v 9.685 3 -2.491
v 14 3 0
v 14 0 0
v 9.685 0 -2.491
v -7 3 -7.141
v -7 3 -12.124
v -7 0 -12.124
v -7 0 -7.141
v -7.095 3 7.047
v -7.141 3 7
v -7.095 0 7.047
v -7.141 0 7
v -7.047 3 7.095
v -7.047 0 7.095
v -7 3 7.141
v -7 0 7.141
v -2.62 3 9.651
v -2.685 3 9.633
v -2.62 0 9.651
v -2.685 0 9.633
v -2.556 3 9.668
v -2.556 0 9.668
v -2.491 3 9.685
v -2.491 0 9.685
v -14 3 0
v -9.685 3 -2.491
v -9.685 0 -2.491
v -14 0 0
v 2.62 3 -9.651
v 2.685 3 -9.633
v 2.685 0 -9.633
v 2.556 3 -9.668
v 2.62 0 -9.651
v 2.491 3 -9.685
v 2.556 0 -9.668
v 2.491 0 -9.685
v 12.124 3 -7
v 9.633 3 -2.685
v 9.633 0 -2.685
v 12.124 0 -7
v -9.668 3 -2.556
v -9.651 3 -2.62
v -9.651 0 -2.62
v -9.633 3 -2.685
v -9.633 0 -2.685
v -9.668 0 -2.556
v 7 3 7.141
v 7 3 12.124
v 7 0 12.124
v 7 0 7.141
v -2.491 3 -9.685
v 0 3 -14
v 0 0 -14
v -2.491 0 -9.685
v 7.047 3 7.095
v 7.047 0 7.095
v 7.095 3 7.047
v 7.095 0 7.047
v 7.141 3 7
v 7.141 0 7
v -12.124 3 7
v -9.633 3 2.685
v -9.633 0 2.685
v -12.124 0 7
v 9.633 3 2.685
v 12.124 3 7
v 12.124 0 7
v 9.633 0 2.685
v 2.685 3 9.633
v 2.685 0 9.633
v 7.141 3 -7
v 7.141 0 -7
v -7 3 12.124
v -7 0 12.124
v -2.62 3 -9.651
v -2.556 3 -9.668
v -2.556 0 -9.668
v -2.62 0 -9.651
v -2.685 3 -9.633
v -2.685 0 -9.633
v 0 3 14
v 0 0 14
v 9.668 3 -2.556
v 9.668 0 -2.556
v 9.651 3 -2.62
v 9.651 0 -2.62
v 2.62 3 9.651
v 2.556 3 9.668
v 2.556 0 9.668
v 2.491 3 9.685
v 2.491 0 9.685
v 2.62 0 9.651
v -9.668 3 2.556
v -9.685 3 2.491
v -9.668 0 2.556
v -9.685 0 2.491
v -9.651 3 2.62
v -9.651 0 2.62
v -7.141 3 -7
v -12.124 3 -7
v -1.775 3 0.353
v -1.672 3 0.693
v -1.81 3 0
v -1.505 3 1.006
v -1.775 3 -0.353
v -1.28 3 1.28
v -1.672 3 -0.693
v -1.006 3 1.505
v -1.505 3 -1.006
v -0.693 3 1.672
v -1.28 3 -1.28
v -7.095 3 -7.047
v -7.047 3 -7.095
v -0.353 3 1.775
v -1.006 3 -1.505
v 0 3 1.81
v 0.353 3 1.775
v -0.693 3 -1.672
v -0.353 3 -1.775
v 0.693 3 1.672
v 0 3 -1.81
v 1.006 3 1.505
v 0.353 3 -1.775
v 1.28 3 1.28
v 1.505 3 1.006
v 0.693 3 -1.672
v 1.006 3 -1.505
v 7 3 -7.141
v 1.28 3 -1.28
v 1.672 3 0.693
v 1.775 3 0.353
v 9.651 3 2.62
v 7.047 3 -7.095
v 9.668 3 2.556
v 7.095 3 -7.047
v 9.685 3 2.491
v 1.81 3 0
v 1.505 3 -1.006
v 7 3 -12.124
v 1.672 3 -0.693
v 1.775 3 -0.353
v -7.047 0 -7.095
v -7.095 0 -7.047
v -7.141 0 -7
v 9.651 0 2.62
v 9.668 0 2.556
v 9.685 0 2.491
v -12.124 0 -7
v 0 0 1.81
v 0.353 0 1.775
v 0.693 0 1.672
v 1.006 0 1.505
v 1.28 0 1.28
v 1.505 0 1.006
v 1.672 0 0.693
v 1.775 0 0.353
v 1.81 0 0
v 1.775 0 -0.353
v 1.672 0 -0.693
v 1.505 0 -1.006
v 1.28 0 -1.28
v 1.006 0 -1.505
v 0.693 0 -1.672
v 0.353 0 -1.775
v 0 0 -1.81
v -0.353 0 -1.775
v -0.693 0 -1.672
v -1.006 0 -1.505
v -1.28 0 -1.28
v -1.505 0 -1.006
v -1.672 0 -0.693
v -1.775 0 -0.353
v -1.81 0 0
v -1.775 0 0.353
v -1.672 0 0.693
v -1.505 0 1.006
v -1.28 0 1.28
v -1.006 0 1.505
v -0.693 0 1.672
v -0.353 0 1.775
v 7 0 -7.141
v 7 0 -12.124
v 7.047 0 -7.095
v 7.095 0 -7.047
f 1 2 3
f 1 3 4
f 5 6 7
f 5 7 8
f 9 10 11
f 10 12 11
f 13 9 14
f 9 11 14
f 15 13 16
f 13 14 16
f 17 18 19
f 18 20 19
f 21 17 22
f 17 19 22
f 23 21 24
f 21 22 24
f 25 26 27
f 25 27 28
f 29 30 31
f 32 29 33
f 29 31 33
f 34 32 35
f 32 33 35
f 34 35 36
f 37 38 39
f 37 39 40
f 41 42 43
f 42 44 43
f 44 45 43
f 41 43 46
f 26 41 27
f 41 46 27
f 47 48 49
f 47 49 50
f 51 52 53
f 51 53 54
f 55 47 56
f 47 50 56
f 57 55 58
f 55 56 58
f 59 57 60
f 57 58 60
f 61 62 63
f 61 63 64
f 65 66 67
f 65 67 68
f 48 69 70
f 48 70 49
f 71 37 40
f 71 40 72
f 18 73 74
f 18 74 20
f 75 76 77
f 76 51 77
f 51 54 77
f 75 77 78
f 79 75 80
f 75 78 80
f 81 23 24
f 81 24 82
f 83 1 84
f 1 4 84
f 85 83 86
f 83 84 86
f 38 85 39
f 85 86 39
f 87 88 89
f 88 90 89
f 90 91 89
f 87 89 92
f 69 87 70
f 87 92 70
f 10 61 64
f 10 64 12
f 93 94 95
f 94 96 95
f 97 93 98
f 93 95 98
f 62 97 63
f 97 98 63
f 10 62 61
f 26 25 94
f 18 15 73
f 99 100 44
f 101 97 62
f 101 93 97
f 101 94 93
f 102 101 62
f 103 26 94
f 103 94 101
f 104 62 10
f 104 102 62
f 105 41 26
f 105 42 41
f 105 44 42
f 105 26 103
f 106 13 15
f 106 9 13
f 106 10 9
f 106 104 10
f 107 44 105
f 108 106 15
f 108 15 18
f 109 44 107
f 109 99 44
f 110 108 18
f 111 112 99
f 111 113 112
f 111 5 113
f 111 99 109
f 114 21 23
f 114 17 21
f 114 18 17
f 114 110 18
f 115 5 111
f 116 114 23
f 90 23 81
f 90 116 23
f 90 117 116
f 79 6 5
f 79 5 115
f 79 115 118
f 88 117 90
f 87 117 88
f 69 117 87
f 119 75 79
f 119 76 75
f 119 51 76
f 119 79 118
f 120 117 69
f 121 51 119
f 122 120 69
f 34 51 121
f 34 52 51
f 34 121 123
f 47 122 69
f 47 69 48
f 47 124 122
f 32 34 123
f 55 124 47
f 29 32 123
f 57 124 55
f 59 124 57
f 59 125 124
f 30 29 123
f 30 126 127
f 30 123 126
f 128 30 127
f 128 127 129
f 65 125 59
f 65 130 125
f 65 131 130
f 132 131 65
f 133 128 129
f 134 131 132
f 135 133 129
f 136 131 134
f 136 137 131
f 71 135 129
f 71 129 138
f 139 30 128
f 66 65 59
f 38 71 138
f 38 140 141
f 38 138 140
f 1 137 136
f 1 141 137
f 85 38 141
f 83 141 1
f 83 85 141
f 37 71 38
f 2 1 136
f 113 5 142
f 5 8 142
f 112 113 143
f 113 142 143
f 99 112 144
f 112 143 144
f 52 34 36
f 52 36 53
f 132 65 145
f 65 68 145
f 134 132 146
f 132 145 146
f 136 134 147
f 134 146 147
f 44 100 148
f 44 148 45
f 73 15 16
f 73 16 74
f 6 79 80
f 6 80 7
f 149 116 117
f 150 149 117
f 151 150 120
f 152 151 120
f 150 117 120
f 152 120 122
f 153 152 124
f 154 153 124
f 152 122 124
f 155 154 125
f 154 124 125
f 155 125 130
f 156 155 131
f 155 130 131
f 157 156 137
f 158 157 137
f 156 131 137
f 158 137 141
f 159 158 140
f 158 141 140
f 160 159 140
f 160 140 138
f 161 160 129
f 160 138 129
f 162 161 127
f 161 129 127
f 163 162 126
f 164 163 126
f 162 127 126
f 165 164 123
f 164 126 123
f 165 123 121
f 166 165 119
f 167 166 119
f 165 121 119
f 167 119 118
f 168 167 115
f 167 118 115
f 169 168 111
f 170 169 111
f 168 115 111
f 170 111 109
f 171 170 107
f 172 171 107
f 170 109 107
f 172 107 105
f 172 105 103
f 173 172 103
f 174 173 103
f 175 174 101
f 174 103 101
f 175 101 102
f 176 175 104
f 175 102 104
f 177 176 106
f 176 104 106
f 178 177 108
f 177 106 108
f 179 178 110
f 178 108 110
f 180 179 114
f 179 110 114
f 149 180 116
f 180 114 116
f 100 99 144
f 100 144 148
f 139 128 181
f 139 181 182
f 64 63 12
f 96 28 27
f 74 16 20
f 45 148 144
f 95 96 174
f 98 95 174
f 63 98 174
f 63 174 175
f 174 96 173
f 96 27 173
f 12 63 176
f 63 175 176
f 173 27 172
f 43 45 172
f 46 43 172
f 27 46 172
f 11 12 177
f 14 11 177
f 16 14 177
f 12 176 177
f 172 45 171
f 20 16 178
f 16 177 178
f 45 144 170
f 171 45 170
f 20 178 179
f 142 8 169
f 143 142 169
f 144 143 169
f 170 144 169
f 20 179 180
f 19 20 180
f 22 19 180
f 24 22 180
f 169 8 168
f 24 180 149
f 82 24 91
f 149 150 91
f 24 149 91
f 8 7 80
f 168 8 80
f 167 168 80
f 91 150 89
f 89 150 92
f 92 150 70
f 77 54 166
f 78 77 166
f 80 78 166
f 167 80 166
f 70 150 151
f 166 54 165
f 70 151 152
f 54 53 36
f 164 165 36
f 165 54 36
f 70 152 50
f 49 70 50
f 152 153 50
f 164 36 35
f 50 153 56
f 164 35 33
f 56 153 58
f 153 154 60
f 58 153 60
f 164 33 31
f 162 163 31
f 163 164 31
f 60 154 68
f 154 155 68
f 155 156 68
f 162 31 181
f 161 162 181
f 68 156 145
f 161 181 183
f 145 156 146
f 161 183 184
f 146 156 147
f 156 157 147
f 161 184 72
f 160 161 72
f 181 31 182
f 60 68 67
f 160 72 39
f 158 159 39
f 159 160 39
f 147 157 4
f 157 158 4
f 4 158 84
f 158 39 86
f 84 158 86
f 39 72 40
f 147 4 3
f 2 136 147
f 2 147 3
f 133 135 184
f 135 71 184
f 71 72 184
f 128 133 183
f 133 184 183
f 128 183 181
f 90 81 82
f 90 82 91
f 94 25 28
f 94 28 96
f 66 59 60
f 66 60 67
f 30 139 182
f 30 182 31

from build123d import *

# Parameters (mm, degrees)
SKETCH1_R           = 10
BOSS_EXTRUDE1_DEPTH = 3
BOSS_EXTRUDE2_DEPTH = 3
CIRPATTERN1_COUNT   = 12
SKETCH3_R           = 1.81
CUT_EXTRUDE1_DEPTH  = 3


with BuildPart() as part:
    # Sketch1 → Boss-Extrude1 (new body)
    with BuildSketch(Plane(origin=(0, 0, 0), x_dir=(1, 0, 0), z_dir=(0, 1, 0))):
        with Locations(Location((0, 0, 0), (0, 0, 270))):
            Circle(SKETCH1_R)
    extrude(amount=BOSS_EXTRUDE1_DEPTH)

    # Sketch2 → Boss-Extrude2 (add)
    with BuildSketch(Plane(origin=(0, 3, 0), x_dir=(1, 0, 0), z_dir=(0, 1, 0))):
        Polygon((0, 14), (-2.491463612, 9.684658438), (2.491463612, 9.684658438), align=None)
    boss_extrude2 = extrude(amount=-BOSS_EXTRUDE2_DEPTH)

    # CirPattern1: Boss-Extrude2 ×12 about axis
    cirpattern1_axis = Axis((0, 0, 0), (0, 1, 0))
    for i in range(1, CIRPATTERN1_COUNT):
        add(boss_extrude2.rotate(cirpattern1_axis, i * 360 / CIRPATTERN1_COUNT))

    # Sketch3 → Cut-Extrude1 (cut)
    with BuildSketch(Plane(origin=(0, 3, 0), x_dir=(1, 0, 0), z_dir=(0, 1, 0))):
        with Locations(Location((0, 0, 0), (0, 0, 270))):
            Circle(SKETCH3_R)
    extrude(amount=-CUT_EXTRUDE1_DEPTH, mode=Mode.SUBTRACT)


solid = part.part
